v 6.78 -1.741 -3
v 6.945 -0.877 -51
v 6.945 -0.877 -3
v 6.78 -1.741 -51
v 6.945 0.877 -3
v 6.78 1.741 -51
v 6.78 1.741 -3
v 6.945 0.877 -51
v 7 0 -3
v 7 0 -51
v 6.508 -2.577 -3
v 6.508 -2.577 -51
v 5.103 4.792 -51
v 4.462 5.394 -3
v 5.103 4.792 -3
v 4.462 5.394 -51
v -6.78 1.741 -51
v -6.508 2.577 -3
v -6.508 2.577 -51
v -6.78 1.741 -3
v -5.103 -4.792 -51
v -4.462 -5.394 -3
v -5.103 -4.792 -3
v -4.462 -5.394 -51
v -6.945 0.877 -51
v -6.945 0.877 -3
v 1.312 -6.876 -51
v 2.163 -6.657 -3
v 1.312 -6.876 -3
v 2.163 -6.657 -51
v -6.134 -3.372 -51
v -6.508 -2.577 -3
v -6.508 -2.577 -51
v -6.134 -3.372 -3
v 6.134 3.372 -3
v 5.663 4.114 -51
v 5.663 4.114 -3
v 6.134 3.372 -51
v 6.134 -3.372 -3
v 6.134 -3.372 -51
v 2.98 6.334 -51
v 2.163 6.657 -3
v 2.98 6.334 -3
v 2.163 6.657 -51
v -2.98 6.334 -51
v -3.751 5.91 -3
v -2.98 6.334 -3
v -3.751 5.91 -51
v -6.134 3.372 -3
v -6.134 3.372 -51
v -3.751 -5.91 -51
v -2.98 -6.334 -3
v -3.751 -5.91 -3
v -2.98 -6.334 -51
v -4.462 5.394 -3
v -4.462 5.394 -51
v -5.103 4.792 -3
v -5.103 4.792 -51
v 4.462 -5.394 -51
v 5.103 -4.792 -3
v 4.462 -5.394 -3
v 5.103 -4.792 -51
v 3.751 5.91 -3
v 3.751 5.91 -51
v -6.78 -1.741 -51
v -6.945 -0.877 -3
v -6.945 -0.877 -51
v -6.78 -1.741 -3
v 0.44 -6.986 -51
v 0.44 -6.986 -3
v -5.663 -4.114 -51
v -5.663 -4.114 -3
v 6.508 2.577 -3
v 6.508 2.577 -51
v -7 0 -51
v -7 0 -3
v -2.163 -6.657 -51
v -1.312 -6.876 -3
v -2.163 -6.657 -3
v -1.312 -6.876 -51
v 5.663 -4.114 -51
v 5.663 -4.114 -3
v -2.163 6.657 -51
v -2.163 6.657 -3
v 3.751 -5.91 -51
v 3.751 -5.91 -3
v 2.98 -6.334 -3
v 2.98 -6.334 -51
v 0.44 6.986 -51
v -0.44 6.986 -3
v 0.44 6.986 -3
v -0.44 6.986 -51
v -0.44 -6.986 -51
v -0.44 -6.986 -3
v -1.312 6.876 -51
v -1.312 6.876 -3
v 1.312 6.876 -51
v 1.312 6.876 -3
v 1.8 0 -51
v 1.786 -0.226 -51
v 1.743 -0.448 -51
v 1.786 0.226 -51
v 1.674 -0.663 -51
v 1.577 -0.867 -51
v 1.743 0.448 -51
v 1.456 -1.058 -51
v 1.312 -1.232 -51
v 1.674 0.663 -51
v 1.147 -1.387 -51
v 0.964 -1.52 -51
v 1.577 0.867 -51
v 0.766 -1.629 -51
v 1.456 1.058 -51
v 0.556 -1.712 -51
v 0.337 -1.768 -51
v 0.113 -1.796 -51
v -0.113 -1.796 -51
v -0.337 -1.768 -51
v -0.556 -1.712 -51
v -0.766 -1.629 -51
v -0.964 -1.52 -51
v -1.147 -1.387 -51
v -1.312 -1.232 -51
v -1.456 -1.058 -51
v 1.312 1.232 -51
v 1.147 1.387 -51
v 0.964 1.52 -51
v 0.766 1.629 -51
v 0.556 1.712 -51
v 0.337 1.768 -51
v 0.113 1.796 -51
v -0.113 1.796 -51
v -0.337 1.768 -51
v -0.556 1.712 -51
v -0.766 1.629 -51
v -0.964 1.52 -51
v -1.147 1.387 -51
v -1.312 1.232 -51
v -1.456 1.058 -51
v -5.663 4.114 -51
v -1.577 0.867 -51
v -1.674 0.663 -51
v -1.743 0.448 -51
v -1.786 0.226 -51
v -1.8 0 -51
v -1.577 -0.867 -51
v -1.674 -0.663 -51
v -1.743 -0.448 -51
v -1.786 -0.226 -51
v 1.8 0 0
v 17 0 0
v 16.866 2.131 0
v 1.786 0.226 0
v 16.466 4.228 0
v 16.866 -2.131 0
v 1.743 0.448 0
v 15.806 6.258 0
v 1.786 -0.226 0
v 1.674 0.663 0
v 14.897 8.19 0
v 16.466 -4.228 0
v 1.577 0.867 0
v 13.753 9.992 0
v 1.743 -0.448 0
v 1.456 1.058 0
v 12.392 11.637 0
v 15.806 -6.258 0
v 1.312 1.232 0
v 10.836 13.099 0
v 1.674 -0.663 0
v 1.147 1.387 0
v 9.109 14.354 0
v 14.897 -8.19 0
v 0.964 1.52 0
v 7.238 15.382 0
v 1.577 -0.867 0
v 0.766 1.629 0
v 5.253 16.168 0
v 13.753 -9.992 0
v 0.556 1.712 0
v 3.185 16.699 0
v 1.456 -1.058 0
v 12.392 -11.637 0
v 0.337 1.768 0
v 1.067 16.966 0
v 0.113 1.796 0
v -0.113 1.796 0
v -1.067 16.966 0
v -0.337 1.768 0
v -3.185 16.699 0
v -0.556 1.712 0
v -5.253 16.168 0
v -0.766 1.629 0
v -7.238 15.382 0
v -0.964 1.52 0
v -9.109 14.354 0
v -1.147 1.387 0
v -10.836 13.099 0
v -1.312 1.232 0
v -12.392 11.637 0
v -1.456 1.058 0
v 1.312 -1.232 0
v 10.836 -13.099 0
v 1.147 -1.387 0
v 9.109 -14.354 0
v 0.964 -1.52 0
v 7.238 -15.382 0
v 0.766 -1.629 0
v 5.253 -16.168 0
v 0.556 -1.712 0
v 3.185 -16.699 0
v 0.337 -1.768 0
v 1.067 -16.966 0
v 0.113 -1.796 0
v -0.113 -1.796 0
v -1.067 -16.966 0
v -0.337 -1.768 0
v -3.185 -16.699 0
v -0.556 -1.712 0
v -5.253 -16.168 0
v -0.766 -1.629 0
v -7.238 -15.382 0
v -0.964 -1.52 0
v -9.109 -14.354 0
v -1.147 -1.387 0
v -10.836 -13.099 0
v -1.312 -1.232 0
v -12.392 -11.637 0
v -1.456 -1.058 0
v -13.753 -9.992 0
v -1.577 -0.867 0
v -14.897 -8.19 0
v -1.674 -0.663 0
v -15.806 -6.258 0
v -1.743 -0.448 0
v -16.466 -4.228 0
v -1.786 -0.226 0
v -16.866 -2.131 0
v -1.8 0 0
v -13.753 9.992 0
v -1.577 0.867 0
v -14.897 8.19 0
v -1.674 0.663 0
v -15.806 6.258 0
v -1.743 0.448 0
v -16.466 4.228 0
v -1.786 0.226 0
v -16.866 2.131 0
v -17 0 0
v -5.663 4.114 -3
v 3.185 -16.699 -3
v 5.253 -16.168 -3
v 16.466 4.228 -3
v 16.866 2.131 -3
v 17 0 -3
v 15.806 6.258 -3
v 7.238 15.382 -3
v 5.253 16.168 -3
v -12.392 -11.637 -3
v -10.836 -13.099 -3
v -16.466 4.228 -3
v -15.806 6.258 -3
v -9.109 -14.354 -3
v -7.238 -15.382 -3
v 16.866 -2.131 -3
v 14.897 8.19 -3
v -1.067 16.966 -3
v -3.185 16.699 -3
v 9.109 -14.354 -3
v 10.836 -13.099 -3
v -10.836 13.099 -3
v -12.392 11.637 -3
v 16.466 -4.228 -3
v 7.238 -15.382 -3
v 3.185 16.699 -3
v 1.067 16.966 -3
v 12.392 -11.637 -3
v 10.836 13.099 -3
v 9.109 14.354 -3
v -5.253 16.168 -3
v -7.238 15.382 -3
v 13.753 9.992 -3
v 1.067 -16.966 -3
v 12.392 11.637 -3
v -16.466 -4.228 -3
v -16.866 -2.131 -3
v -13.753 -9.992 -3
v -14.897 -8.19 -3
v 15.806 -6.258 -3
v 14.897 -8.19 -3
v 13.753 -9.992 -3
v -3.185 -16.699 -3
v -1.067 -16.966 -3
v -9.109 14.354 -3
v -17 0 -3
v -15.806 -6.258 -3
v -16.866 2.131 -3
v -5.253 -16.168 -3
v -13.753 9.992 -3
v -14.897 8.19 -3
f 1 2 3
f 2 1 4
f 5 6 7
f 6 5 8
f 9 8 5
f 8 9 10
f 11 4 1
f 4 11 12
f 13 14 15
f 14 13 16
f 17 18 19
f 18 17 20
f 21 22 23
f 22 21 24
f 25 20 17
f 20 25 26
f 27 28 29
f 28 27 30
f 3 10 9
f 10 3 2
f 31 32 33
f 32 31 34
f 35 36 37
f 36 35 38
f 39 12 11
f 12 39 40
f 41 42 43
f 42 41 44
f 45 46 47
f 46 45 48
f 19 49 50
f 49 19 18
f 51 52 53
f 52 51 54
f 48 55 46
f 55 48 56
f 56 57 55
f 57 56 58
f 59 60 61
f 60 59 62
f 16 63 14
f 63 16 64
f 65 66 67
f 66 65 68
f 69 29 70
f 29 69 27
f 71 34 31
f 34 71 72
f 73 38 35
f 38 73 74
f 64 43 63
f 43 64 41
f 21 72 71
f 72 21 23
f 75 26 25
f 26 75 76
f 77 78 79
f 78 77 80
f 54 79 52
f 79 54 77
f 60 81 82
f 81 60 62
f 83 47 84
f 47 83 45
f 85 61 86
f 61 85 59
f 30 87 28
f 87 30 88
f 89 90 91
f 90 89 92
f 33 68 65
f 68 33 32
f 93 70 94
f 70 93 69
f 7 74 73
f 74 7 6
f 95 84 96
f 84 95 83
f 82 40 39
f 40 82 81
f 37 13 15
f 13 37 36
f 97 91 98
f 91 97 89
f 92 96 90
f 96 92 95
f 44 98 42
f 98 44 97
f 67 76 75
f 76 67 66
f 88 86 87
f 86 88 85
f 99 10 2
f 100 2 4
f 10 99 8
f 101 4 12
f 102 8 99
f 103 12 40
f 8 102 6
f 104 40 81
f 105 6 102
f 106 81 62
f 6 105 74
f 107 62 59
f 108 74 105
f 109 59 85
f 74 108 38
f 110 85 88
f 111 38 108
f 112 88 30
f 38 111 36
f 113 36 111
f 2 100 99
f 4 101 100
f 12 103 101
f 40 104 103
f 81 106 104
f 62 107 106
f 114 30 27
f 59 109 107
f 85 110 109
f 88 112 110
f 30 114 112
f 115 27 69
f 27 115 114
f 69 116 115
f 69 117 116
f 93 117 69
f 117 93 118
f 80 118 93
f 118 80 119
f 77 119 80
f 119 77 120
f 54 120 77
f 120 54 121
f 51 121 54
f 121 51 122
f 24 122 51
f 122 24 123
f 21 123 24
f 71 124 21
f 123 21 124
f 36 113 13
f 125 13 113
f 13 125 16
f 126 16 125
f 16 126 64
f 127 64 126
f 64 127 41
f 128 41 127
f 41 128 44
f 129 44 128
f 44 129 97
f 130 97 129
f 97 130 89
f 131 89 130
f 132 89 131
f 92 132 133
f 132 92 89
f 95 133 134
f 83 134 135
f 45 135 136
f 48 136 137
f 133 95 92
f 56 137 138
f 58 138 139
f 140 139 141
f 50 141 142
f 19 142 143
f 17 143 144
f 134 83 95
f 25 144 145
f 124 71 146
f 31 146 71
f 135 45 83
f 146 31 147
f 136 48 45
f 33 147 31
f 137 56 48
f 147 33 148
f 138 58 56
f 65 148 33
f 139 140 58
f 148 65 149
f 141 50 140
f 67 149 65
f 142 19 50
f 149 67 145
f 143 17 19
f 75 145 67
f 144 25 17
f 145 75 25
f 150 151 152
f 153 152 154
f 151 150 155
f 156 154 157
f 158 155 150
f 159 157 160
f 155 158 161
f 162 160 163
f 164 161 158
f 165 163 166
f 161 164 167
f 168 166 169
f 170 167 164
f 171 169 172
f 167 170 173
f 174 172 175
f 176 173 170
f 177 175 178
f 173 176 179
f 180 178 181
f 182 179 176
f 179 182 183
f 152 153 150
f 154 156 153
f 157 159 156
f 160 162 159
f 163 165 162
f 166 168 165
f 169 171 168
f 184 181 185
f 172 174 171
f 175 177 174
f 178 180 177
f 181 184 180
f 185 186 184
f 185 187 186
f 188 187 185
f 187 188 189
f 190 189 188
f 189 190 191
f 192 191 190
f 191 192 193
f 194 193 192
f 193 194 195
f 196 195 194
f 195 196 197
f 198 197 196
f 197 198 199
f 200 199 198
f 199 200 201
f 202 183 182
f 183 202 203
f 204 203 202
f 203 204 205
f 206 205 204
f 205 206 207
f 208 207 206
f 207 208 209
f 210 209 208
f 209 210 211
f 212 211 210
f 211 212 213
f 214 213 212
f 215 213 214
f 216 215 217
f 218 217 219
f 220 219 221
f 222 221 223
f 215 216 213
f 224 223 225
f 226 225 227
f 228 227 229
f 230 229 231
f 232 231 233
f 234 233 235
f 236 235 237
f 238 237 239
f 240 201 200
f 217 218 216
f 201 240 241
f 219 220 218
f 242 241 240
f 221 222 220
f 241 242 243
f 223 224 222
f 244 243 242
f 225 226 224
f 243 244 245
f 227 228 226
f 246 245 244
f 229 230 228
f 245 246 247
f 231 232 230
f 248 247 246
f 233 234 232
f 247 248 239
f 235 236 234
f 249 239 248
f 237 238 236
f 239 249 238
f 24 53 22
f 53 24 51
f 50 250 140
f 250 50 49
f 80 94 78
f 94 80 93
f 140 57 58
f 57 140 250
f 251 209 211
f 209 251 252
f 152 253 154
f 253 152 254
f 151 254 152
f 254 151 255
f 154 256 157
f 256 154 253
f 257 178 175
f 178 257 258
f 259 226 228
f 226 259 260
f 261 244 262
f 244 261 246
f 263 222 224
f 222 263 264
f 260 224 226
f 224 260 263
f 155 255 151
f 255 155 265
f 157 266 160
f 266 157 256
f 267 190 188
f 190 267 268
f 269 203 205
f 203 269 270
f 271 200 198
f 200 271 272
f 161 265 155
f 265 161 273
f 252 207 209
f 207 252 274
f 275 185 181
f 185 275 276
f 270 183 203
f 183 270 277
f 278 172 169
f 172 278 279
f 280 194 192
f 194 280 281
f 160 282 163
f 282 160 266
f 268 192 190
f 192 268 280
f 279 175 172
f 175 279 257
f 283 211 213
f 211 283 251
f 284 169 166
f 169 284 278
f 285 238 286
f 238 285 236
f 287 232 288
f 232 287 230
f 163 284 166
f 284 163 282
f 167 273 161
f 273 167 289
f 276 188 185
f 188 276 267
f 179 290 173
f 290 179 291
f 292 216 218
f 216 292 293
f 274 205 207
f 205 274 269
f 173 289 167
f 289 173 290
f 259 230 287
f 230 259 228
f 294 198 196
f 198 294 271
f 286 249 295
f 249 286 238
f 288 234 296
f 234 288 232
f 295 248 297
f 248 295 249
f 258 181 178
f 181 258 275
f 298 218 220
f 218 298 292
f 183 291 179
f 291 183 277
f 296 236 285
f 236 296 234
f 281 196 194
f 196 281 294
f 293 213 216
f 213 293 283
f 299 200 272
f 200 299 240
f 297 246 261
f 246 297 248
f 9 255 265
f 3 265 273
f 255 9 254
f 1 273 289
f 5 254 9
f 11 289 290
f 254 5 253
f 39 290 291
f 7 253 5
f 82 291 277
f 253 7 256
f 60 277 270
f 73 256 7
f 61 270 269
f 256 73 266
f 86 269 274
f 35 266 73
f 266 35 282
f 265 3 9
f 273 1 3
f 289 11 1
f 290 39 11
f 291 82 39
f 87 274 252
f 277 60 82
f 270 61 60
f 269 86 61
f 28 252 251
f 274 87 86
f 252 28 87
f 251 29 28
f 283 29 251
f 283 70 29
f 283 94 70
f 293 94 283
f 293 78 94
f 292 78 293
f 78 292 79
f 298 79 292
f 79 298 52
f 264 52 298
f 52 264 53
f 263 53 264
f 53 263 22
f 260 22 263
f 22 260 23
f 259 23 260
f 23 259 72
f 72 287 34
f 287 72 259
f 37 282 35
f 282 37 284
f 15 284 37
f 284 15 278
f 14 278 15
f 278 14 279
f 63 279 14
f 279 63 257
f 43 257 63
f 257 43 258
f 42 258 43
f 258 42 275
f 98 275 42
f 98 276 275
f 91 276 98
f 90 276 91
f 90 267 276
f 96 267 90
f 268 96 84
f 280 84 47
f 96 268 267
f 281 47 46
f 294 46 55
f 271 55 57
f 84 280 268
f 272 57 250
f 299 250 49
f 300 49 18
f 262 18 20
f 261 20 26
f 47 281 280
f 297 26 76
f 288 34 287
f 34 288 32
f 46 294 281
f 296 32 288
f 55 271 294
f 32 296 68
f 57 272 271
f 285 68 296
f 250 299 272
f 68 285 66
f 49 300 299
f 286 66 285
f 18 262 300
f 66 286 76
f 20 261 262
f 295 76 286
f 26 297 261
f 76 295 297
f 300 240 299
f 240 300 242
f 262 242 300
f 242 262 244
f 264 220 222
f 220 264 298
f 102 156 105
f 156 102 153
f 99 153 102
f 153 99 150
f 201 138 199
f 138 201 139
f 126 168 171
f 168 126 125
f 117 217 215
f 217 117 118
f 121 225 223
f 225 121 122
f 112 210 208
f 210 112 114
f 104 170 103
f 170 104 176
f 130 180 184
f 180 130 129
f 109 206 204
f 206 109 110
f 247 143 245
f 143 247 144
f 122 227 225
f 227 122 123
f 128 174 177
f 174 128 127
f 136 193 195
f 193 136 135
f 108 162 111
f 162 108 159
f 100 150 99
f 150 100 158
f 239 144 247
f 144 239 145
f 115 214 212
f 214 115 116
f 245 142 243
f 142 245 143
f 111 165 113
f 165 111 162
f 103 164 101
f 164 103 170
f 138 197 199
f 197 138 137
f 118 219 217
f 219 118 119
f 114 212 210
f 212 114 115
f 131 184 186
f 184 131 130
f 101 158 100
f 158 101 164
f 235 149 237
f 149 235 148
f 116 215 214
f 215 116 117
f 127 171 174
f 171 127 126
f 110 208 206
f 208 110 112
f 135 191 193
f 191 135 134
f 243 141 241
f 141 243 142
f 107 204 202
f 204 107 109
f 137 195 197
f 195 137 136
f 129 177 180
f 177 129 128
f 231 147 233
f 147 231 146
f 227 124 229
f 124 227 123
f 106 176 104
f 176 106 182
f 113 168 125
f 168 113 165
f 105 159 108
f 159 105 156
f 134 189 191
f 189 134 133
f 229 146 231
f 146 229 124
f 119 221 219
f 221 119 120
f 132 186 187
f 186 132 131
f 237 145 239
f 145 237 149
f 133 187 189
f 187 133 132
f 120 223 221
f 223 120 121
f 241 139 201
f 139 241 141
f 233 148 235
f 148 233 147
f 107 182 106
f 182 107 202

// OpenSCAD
$fn = 50;


difference() {
	union() {
		translate(v = [0, 0, -51.0000000000]) {
			cylinder(h = 51, r = 7.0000000000);
		}
		translate(v = [0, 0, -3.0000000000]) {
			cylinder(h = 3, r = 17.0000000000);
		}
	}
	union() {
		#translate(v = [0, 0, -51]) {
			cylinder(h = 51, r = 1.8000000000);
		}
	}
}
